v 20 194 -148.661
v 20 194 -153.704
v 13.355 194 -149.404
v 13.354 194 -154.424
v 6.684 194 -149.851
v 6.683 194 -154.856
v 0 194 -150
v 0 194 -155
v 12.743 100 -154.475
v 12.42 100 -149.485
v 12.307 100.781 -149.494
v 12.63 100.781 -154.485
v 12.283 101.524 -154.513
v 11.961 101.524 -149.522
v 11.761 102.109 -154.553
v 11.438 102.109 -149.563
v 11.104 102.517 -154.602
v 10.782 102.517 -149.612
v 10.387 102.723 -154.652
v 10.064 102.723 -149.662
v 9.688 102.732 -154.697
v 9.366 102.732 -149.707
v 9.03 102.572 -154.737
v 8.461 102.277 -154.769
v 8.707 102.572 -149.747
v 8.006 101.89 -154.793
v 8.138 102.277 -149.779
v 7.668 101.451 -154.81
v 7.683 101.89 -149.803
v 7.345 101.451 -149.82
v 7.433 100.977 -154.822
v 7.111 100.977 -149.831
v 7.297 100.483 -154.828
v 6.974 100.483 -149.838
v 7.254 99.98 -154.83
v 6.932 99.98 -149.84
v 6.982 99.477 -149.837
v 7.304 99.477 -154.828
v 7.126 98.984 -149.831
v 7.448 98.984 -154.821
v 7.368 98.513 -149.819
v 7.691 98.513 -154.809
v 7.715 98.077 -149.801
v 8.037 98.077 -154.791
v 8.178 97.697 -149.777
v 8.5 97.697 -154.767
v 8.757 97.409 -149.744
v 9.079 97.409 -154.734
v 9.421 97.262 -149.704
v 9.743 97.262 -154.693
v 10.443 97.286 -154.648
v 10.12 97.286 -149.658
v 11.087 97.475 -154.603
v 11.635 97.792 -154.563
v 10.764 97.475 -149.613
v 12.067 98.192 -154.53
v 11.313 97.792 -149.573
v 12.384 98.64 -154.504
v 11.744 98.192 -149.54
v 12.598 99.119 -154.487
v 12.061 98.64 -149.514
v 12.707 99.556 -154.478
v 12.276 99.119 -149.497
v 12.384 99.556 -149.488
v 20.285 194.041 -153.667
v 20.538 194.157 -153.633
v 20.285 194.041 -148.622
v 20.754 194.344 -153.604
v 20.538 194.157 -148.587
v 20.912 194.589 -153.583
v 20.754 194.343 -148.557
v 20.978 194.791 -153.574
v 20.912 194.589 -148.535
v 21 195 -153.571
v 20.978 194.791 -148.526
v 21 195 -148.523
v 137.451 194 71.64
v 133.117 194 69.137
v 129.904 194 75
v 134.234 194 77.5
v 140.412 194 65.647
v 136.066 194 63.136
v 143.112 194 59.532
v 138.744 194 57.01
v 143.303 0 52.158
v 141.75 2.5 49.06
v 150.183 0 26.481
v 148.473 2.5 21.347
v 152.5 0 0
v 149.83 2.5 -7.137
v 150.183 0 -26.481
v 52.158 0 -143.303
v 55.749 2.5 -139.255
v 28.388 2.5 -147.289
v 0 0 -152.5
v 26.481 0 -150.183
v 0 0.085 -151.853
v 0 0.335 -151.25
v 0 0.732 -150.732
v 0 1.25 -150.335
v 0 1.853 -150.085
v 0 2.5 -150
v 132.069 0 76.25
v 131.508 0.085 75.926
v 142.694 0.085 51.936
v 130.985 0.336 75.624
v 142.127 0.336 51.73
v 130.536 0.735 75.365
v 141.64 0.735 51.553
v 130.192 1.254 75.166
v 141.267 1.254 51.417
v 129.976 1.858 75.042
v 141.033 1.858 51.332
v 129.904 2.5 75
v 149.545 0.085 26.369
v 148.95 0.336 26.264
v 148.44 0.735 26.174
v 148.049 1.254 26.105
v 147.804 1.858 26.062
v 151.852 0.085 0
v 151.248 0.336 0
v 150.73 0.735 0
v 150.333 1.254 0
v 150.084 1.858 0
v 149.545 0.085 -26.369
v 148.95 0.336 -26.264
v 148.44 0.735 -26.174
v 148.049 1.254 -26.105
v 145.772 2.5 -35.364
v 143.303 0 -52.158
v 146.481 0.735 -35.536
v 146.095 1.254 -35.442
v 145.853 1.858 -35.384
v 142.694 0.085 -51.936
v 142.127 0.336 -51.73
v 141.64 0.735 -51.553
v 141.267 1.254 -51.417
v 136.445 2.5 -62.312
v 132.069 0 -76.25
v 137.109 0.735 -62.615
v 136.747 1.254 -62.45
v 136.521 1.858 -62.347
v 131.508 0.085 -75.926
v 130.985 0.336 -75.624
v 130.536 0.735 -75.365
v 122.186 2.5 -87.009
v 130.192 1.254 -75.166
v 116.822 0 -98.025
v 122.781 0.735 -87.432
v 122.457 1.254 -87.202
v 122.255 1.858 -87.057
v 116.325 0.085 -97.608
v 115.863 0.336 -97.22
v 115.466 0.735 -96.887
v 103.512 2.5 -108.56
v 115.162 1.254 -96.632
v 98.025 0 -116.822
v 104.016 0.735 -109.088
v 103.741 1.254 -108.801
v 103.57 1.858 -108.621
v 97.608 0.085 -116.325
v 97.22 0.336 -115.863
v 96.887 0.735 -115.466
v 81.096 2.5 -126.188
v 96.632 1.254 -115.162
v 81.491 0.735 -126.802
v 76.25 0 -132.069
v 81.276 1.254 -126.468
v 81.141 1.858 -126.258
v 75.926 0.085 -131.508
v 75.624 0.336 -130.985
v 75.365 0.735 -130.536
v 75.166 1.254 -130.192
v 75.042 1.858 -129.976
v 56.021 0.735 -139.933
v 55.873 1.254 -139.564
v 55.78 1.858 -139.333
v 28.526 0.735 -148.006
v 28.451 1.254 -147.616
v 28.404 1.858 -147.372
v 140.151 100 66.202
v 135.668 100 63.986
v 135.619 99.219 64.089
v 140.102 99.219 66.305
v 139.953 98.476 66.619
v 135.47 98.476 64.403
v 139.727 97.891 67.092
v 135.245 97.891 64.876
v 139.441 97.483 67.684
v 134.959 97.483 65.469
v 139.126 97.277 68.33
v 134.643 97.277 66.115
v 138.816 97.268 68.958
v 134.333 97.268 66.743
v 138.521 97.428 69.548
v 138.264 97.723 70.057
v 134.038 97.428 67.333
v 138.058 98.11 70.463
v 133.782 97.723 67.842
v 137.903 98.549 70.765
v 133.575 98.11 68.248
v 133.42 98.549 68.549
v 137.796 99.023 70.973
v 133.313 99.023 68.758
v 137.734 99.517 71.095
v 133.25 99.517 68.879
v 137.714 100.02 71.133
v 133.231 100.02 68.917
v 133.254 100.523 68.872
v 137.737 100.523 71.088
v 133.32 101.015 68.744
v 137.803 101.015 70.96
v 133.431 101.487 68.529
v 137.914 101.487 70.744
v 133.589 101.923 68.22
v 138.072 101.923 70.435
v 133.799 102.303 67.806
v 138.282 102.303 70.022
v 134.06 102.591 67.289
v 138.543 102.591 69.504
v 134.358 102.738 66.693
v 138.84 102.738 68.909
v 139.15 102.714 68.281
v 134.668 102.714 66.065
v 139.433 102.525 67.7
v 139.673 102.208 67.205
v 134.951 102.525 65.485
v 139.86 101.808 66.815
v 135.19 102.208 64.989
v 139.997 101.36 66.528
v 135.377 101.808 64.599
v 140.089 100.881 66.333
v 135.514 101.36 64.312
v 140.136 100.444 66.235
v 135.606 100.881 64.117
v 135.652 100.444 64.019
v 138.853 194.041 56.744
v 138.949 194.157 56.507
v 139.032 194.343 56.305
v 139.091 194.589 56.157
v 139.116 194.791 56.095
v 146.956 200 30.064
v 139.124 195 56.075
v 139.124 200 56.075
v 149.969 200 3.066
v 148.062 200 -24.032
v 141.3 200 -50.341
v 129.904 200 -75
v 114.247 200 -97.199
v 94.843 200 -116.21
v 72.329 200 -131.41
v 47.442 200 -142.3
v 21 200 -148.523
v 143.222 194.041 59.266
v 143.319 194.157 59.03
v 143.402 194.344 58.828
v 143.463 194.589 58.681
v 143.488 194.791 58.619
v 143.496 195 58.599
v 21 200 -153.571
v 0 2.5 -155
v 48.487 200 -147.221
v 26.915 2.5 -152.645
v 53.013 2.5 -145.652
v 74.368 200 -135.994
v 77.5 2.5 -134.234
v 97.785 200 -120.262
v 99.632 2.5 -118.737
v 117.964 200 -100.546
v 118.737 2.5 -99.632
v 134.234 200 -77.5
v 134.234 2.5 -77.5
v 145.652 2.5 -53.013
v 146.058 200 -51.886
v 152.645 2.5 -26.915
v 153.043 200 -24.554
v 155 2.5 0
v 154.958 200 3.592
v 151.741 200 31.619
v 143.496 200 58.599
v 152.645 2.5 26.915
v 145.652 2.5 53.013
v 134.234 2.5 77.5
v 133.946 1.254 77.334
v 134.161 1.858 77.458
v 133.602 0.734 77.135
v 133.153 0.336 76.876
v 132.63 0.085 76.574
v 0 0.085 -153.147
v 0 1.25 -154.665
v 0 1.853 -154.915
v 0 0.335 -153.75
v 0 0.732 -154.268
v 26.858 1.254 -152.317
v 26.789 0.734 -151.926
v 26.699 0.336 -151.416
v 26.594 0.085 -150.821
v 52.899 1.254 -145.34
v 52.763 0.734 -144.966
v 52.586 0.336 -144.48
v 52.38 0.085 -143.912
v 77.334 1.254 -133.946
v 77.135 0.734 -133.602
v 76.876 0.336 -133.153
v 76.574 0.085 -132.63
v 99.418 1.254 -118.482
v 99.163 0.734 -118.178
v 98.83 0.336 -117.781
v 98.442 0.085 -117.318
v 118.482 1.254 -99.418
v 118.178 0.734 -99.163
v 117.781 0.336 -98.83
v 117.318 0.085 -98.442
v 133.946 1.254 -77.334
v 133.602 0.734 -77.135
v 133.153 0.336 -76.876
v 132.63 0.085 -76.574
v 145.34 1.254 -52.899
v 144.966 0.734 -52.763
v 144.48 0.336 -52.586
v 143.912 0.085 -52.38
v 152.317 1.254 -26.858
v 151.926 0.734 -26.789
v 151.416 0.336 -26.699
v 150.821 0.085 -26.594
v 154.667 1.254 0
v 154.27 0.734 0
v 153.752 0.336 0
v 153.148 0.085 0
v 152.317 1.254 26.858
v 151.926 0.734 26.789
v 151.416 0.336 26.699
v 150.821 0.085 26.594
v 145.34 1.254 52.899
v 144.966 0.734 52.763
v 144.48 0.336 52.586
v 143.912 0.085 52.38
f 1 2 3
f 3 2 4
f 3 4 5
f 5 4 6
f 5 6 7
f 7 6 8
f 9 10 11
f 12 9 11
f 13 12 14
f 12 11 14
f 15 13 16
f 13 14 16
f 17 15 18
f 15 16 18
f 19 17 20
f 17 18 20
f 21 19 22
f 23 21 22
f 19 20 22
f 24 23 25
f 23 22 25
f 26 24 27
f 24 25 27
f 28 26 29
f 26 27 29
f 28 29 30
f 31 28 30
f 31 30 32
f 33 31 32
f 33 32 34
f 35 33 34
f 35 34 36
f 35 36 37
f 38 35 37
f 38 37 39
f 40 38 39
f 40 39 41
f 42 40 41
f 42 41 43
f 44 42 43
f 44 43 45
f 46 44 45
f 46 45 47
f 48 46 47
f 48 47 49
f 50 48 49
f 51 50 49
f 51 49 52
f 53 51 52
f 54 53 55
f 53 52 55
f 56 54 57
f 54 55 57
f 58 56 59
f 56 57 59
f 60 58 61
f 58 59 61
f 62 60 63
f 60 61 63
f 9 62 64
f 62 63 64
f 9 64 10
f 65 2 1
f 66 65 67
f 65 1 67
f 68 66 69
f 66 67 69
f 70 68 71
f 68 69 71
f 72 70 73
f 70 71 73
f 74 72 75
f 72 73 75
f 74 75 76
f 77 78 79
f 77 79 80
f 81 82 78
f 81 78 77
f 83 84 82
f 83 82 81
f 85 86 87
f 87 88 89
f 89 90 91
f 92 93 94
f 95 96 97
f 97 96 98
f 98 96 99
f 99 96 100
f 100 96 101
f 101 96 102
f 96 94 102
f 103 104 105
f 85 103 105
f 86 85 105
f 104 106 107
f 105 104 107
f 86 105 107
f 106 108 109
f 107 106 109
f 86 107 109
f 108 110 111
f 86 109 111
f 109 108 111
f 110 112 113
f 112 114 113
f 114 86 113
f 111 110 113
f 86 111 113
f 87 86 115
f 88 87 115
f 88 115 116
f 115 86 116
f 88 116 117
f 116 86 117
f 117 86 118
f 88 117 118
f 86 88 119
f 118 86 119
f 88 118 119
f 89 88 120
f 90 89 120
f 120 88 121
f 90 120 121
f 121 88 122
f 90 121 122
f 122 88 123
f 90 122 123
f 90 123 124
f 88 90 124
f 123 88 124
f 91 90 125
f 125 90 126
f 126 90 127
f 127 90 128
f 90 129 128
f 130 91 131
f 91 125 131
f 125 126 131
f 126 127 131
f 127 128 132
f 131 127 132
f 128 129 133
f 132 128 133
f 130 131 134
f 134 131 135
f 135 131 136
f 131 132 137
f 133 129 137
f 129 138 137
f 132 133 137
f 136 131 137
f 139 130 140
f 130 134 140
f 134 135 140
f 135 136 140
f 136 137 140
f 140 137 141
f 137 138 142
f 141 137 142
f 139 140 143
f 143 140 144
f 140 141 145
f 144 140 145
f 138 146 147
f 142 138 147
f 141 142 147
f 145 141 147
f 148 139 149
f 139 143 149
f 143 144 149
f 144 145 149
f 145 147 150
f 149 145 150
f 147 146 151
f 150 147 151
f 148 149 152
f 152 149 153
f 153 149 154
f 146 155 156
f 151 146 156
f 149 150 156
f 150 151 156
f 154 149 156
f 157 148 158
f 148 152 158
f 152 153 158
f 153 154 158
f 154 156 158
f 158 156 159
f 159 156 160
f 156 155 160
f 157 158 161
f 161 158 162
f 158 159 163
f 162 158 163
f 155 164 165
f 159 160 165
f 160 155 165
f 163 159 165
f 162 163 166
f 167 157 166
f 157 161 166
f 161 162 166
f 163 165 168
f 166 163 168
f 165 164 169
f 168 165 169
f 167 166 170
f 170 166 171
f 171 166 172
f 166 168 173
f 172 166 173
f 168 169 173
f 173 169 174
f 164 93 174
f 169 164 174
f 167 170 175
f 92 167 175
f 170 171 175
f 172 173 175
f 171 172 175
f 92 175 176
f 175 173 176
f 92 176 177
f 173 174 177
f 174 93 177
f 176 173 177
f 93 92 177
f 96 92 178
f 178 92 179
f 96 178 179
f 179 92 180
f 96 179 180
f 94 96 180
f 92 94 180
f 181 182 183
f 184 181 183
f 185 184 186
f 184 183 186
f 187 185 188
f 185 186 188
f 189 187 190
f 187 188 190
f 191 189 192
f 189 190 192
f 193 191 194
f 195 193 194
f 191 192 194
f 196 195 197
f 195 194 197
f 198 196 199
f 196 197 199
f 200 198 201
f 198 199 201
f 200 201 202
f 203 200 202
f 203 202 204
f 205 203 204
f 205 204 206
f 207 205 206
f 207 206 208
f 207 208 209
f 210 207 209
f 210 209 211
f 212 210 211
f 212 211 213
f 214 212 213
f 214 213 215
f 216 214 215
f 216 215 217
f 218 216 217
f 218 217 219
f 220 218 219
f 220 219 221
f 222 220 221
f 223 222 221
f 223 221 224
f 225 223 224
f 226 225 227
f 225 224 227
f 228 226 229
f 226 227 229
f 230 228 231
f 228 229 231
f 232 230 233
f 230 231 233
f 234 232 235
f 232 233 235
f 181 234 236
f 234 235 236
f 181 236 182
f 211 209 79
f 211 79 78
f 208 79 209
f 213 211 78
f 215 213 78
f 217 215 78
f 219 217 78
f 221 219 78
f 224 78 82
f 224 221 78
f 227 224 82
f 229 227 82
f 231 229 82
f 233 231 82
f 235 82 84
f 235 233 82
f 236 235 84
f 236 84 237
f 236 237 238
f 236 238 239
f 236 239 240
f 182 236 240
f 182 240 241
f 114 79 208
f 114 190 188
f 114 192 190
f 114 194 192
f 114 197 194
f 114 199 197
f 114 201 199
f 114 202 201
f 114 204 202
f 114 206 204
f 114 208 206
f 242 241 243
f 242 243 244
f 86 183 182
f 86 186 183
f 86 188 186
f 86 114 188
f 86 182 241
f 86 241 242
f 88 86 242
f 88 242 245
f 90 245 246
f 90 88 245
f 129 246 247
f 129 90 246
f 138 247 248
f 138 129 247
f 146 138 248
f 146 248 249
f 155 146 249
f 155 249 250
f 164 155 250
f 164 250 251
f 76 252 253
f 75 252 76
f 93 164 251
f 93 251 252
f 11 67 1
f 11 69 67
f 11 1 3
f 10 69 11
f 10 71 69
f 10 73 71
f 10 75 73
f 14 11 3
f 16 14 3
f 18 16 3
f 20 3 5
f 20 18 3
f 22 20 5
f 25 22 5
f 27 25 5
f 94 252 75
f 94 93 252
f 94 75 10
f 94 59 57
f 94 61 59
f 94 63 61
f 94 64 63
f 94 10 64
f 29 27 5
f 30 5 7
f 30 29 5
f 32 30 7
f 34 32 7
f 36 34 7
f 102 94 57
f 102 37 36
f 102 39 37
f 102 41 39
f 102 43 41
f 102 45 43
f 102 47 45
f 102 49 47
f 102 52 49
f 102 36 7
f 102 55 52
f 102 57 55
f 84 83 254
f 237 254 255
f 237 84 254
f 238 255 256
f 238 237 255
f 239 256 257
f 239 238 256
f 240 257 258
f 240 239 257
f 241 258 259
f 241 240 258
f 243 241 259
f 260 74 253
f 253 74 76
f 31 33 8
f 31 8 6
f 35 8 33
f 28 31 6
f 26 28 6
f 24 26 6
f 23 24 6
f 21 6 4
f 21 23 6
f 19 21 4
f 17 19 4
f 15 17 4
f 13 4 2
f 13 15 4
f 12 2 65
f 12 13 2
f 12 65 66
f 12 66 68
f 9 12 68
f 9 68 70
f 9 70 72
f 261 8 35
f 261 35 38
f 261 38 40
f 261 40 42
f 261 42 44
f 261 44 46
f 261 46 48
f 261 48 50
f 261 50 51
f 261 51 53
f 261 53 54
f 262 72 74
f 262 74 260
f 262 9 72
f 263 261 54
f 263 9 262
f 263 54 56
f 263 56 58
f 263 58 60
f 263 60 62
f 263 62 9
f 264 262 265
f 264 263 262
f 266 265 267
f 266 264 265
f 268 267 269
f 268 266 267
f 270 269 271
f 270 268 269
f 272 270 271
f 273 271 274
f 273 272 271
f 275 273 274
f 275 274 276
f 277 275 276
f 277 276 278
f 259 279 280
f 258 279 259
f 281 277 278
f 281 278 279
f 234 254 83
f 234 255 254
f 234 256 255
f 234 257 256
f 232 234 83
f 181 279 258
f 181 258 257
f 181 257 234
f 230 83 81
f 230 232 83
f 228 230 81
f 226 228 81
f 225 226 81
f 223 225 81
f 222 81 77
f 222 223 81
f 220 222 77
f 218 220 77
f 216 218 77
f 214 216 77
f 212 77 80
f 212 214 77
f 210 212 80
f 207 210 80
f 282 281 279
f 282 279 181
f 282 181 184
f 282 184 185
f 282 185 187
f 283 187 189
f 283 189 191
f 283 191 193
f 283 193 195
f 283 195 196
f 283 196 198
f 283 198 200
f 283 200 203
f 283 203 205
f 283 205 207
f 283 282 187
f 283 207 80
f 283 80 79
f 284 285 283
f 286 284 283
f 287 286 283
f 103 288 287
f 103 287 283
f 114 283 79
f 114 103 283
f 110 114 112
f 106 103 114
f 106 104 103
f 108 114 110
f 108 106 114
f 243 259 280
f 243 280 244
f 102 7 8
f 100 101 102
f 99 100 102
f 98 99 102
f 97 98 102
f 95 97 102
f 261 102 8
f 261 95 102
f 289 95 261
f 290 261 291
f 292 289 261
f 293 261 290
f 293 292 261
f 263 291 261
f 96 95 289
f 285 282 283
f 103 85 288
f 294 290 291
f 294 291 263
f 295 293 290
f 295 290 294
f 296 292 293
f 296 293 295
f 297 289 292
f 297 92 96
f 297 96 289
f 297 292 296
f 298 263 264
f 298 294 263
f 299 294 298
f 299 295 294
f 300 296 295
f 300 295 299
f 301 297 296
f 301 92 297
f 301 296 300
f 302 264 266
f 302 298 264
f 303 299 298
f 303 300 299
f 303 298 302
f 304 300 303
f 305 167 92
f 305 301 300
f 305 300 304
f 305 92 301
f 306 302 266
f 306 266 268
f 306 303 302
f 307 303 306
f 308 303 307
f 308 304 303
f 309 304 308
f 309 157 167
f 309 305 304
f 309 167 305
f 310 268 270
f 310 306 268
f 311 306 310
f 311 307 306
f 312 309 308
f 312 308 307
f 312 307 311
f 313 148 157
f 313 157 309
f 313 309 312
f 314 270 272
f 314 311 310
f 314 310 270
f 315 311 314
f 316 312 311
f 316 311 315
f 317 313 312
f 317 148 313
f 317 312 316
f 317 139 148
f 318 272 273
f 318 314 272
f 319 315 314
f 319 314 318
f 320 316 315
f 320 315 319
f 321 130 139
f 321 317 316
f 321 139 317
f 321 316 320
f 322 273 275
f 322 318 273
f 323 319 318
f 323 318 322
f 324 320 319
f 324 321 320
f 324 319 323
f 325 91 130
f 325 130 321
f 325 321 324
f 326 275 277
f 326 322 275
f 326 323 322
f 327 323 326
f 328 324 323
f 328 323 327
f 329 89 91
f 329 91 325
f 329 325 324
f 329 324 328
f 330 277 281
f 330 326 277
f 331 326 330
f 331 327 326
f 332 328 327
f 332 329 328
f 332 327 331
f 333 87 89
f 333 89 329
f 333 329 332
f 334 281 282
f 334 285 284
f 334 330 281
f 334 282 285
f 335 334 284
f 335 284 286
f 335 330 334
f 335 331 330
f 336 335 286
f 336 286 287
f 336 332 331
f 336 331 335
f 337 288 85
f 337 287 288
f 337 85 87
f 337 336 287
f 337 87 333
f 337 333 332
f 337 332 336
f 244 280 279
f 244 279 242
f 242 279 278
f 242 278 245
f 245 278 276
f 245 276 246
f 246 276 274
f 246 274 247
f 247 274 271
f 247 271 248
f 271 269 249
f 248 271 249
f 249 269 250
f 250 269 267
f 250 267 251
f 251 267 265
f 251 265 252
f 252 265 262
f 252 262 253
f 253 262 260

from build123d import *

# Parameters (mm, degrees)
BOSS_EXTRUDE1_DEPTH            = 200
CUT_EXTRUDE1_START             = -6
CUT_EXTRUDE1_DEPTH             = 6
FILLET1_R                      = 1
FILLET2_R                      = 2.5
M5_CLEARANCE_HOLE1_D           = 5.5
M5_CLEARANCE_HOLE1_ON_FACE_2_D = 5.5


with BuildPart() as part:
    # Sketch1 → Boss-Extrude1 (new body)
    with BuildSketch(Plane(origin=(0, 0, 0), x_dir=(1, 0, 0), z_dir=(0, 1, 0))):
        with BuildLine():
            Line((0, 150), (0, 155))
            ThreePointArc((0, 155), (134.233937587, 77.5), (134.233937587, -77.5))
            Line((134.233937587, -77.5), (129.903810568, -75))
            ThreePointArc((129.903810568, -75), (129.903810568, 75), (0, 150))
        make_face()
    extrude(amount=BOSS_EXTRUDE1_DEPTH)

    # Sketch3 → Cut-Extrude1 (cut)
    with BuildSketch(Plane(origin=(0, 200, 0), x_dir=(1, 0, 0), z_dir=(0, 1, 0)).offset(CUT_EXTRUDE1_START)):
        with BuildLine():
            Line((21, 153.570830564), (21, 148.522725534))
            ThreePointArc((21, 148.522725534), (10.525948174, 149.630225606), (0, 150))
            Line((0, 150), (0, 155))
            ThreePointArc((0, 155), (10.524287687, 154.642294889), (21, 153.570830564))
        make_face()
        with BuildLine():
            Line((143.496240548, -58.598881802), (139.124453352, -56.074829287))
            ThreePointArc((139.124453352, -56.074829287), (134.846550636, -65.699374286), (129.903810568, -75))
            Line((129.903810568, -75), (134.233937587, -77.5))
            ThreePointArc((134.233937587, -77.5), (139.186299717, -68.206846951), (143.496240548, -58.598881802))
        make_face()
    extrude(amount=CUT_EXTRUDE1_DEPTH, mode=Mode.SUBTRACT)

    # Fillet1
    fillet1_edges = [part.edges().sort_by_distance(p)[0] for p in [
        (21, 194, -151.046778049),
        (141.31034695, 194, 57.336855545),
    ]]
    fillet(fillet1_edges, radius=FILLET1_R)

    # Fillet2
    fillet2_edges = [part.edges().sort_by_distance(p)[0] for p in [
        (134.233937587, 0, -77.5),
        (129.903810568, 0, -75),
    ]]
    fillet(fillet2_edges, radius=FILLET2_R - 0.0001)  # a hair under: the kernel refuses the full size

    # M5 Clearance Hole1 (through all)
    with Locations(Plane(origin=(138.954283246, 100, 68.678287453), x_dir=(-0.443085725506, 0, 0.89647924675), z_dir=(0.89647924675, 0, 0.443085725506))):
        with Locations((0, 0)):
            Hole(M5_CLEARANCE_HOLE1_D / 2)

    # M5 Clearance Hole1 on face 2 (through all)
    with Locations(Plane(origin=(10, 100, -154.677082983), x_dir=(-0.997916674108, 0, -0.064515978931), z_dir=(0.064515978931, 0, -0.997916674108))):
        with Locations((0, 0)):
            Hole(M5_CLEARANCE_HOLE1_ON_FACE_2_D / 2)


solid = part.part
